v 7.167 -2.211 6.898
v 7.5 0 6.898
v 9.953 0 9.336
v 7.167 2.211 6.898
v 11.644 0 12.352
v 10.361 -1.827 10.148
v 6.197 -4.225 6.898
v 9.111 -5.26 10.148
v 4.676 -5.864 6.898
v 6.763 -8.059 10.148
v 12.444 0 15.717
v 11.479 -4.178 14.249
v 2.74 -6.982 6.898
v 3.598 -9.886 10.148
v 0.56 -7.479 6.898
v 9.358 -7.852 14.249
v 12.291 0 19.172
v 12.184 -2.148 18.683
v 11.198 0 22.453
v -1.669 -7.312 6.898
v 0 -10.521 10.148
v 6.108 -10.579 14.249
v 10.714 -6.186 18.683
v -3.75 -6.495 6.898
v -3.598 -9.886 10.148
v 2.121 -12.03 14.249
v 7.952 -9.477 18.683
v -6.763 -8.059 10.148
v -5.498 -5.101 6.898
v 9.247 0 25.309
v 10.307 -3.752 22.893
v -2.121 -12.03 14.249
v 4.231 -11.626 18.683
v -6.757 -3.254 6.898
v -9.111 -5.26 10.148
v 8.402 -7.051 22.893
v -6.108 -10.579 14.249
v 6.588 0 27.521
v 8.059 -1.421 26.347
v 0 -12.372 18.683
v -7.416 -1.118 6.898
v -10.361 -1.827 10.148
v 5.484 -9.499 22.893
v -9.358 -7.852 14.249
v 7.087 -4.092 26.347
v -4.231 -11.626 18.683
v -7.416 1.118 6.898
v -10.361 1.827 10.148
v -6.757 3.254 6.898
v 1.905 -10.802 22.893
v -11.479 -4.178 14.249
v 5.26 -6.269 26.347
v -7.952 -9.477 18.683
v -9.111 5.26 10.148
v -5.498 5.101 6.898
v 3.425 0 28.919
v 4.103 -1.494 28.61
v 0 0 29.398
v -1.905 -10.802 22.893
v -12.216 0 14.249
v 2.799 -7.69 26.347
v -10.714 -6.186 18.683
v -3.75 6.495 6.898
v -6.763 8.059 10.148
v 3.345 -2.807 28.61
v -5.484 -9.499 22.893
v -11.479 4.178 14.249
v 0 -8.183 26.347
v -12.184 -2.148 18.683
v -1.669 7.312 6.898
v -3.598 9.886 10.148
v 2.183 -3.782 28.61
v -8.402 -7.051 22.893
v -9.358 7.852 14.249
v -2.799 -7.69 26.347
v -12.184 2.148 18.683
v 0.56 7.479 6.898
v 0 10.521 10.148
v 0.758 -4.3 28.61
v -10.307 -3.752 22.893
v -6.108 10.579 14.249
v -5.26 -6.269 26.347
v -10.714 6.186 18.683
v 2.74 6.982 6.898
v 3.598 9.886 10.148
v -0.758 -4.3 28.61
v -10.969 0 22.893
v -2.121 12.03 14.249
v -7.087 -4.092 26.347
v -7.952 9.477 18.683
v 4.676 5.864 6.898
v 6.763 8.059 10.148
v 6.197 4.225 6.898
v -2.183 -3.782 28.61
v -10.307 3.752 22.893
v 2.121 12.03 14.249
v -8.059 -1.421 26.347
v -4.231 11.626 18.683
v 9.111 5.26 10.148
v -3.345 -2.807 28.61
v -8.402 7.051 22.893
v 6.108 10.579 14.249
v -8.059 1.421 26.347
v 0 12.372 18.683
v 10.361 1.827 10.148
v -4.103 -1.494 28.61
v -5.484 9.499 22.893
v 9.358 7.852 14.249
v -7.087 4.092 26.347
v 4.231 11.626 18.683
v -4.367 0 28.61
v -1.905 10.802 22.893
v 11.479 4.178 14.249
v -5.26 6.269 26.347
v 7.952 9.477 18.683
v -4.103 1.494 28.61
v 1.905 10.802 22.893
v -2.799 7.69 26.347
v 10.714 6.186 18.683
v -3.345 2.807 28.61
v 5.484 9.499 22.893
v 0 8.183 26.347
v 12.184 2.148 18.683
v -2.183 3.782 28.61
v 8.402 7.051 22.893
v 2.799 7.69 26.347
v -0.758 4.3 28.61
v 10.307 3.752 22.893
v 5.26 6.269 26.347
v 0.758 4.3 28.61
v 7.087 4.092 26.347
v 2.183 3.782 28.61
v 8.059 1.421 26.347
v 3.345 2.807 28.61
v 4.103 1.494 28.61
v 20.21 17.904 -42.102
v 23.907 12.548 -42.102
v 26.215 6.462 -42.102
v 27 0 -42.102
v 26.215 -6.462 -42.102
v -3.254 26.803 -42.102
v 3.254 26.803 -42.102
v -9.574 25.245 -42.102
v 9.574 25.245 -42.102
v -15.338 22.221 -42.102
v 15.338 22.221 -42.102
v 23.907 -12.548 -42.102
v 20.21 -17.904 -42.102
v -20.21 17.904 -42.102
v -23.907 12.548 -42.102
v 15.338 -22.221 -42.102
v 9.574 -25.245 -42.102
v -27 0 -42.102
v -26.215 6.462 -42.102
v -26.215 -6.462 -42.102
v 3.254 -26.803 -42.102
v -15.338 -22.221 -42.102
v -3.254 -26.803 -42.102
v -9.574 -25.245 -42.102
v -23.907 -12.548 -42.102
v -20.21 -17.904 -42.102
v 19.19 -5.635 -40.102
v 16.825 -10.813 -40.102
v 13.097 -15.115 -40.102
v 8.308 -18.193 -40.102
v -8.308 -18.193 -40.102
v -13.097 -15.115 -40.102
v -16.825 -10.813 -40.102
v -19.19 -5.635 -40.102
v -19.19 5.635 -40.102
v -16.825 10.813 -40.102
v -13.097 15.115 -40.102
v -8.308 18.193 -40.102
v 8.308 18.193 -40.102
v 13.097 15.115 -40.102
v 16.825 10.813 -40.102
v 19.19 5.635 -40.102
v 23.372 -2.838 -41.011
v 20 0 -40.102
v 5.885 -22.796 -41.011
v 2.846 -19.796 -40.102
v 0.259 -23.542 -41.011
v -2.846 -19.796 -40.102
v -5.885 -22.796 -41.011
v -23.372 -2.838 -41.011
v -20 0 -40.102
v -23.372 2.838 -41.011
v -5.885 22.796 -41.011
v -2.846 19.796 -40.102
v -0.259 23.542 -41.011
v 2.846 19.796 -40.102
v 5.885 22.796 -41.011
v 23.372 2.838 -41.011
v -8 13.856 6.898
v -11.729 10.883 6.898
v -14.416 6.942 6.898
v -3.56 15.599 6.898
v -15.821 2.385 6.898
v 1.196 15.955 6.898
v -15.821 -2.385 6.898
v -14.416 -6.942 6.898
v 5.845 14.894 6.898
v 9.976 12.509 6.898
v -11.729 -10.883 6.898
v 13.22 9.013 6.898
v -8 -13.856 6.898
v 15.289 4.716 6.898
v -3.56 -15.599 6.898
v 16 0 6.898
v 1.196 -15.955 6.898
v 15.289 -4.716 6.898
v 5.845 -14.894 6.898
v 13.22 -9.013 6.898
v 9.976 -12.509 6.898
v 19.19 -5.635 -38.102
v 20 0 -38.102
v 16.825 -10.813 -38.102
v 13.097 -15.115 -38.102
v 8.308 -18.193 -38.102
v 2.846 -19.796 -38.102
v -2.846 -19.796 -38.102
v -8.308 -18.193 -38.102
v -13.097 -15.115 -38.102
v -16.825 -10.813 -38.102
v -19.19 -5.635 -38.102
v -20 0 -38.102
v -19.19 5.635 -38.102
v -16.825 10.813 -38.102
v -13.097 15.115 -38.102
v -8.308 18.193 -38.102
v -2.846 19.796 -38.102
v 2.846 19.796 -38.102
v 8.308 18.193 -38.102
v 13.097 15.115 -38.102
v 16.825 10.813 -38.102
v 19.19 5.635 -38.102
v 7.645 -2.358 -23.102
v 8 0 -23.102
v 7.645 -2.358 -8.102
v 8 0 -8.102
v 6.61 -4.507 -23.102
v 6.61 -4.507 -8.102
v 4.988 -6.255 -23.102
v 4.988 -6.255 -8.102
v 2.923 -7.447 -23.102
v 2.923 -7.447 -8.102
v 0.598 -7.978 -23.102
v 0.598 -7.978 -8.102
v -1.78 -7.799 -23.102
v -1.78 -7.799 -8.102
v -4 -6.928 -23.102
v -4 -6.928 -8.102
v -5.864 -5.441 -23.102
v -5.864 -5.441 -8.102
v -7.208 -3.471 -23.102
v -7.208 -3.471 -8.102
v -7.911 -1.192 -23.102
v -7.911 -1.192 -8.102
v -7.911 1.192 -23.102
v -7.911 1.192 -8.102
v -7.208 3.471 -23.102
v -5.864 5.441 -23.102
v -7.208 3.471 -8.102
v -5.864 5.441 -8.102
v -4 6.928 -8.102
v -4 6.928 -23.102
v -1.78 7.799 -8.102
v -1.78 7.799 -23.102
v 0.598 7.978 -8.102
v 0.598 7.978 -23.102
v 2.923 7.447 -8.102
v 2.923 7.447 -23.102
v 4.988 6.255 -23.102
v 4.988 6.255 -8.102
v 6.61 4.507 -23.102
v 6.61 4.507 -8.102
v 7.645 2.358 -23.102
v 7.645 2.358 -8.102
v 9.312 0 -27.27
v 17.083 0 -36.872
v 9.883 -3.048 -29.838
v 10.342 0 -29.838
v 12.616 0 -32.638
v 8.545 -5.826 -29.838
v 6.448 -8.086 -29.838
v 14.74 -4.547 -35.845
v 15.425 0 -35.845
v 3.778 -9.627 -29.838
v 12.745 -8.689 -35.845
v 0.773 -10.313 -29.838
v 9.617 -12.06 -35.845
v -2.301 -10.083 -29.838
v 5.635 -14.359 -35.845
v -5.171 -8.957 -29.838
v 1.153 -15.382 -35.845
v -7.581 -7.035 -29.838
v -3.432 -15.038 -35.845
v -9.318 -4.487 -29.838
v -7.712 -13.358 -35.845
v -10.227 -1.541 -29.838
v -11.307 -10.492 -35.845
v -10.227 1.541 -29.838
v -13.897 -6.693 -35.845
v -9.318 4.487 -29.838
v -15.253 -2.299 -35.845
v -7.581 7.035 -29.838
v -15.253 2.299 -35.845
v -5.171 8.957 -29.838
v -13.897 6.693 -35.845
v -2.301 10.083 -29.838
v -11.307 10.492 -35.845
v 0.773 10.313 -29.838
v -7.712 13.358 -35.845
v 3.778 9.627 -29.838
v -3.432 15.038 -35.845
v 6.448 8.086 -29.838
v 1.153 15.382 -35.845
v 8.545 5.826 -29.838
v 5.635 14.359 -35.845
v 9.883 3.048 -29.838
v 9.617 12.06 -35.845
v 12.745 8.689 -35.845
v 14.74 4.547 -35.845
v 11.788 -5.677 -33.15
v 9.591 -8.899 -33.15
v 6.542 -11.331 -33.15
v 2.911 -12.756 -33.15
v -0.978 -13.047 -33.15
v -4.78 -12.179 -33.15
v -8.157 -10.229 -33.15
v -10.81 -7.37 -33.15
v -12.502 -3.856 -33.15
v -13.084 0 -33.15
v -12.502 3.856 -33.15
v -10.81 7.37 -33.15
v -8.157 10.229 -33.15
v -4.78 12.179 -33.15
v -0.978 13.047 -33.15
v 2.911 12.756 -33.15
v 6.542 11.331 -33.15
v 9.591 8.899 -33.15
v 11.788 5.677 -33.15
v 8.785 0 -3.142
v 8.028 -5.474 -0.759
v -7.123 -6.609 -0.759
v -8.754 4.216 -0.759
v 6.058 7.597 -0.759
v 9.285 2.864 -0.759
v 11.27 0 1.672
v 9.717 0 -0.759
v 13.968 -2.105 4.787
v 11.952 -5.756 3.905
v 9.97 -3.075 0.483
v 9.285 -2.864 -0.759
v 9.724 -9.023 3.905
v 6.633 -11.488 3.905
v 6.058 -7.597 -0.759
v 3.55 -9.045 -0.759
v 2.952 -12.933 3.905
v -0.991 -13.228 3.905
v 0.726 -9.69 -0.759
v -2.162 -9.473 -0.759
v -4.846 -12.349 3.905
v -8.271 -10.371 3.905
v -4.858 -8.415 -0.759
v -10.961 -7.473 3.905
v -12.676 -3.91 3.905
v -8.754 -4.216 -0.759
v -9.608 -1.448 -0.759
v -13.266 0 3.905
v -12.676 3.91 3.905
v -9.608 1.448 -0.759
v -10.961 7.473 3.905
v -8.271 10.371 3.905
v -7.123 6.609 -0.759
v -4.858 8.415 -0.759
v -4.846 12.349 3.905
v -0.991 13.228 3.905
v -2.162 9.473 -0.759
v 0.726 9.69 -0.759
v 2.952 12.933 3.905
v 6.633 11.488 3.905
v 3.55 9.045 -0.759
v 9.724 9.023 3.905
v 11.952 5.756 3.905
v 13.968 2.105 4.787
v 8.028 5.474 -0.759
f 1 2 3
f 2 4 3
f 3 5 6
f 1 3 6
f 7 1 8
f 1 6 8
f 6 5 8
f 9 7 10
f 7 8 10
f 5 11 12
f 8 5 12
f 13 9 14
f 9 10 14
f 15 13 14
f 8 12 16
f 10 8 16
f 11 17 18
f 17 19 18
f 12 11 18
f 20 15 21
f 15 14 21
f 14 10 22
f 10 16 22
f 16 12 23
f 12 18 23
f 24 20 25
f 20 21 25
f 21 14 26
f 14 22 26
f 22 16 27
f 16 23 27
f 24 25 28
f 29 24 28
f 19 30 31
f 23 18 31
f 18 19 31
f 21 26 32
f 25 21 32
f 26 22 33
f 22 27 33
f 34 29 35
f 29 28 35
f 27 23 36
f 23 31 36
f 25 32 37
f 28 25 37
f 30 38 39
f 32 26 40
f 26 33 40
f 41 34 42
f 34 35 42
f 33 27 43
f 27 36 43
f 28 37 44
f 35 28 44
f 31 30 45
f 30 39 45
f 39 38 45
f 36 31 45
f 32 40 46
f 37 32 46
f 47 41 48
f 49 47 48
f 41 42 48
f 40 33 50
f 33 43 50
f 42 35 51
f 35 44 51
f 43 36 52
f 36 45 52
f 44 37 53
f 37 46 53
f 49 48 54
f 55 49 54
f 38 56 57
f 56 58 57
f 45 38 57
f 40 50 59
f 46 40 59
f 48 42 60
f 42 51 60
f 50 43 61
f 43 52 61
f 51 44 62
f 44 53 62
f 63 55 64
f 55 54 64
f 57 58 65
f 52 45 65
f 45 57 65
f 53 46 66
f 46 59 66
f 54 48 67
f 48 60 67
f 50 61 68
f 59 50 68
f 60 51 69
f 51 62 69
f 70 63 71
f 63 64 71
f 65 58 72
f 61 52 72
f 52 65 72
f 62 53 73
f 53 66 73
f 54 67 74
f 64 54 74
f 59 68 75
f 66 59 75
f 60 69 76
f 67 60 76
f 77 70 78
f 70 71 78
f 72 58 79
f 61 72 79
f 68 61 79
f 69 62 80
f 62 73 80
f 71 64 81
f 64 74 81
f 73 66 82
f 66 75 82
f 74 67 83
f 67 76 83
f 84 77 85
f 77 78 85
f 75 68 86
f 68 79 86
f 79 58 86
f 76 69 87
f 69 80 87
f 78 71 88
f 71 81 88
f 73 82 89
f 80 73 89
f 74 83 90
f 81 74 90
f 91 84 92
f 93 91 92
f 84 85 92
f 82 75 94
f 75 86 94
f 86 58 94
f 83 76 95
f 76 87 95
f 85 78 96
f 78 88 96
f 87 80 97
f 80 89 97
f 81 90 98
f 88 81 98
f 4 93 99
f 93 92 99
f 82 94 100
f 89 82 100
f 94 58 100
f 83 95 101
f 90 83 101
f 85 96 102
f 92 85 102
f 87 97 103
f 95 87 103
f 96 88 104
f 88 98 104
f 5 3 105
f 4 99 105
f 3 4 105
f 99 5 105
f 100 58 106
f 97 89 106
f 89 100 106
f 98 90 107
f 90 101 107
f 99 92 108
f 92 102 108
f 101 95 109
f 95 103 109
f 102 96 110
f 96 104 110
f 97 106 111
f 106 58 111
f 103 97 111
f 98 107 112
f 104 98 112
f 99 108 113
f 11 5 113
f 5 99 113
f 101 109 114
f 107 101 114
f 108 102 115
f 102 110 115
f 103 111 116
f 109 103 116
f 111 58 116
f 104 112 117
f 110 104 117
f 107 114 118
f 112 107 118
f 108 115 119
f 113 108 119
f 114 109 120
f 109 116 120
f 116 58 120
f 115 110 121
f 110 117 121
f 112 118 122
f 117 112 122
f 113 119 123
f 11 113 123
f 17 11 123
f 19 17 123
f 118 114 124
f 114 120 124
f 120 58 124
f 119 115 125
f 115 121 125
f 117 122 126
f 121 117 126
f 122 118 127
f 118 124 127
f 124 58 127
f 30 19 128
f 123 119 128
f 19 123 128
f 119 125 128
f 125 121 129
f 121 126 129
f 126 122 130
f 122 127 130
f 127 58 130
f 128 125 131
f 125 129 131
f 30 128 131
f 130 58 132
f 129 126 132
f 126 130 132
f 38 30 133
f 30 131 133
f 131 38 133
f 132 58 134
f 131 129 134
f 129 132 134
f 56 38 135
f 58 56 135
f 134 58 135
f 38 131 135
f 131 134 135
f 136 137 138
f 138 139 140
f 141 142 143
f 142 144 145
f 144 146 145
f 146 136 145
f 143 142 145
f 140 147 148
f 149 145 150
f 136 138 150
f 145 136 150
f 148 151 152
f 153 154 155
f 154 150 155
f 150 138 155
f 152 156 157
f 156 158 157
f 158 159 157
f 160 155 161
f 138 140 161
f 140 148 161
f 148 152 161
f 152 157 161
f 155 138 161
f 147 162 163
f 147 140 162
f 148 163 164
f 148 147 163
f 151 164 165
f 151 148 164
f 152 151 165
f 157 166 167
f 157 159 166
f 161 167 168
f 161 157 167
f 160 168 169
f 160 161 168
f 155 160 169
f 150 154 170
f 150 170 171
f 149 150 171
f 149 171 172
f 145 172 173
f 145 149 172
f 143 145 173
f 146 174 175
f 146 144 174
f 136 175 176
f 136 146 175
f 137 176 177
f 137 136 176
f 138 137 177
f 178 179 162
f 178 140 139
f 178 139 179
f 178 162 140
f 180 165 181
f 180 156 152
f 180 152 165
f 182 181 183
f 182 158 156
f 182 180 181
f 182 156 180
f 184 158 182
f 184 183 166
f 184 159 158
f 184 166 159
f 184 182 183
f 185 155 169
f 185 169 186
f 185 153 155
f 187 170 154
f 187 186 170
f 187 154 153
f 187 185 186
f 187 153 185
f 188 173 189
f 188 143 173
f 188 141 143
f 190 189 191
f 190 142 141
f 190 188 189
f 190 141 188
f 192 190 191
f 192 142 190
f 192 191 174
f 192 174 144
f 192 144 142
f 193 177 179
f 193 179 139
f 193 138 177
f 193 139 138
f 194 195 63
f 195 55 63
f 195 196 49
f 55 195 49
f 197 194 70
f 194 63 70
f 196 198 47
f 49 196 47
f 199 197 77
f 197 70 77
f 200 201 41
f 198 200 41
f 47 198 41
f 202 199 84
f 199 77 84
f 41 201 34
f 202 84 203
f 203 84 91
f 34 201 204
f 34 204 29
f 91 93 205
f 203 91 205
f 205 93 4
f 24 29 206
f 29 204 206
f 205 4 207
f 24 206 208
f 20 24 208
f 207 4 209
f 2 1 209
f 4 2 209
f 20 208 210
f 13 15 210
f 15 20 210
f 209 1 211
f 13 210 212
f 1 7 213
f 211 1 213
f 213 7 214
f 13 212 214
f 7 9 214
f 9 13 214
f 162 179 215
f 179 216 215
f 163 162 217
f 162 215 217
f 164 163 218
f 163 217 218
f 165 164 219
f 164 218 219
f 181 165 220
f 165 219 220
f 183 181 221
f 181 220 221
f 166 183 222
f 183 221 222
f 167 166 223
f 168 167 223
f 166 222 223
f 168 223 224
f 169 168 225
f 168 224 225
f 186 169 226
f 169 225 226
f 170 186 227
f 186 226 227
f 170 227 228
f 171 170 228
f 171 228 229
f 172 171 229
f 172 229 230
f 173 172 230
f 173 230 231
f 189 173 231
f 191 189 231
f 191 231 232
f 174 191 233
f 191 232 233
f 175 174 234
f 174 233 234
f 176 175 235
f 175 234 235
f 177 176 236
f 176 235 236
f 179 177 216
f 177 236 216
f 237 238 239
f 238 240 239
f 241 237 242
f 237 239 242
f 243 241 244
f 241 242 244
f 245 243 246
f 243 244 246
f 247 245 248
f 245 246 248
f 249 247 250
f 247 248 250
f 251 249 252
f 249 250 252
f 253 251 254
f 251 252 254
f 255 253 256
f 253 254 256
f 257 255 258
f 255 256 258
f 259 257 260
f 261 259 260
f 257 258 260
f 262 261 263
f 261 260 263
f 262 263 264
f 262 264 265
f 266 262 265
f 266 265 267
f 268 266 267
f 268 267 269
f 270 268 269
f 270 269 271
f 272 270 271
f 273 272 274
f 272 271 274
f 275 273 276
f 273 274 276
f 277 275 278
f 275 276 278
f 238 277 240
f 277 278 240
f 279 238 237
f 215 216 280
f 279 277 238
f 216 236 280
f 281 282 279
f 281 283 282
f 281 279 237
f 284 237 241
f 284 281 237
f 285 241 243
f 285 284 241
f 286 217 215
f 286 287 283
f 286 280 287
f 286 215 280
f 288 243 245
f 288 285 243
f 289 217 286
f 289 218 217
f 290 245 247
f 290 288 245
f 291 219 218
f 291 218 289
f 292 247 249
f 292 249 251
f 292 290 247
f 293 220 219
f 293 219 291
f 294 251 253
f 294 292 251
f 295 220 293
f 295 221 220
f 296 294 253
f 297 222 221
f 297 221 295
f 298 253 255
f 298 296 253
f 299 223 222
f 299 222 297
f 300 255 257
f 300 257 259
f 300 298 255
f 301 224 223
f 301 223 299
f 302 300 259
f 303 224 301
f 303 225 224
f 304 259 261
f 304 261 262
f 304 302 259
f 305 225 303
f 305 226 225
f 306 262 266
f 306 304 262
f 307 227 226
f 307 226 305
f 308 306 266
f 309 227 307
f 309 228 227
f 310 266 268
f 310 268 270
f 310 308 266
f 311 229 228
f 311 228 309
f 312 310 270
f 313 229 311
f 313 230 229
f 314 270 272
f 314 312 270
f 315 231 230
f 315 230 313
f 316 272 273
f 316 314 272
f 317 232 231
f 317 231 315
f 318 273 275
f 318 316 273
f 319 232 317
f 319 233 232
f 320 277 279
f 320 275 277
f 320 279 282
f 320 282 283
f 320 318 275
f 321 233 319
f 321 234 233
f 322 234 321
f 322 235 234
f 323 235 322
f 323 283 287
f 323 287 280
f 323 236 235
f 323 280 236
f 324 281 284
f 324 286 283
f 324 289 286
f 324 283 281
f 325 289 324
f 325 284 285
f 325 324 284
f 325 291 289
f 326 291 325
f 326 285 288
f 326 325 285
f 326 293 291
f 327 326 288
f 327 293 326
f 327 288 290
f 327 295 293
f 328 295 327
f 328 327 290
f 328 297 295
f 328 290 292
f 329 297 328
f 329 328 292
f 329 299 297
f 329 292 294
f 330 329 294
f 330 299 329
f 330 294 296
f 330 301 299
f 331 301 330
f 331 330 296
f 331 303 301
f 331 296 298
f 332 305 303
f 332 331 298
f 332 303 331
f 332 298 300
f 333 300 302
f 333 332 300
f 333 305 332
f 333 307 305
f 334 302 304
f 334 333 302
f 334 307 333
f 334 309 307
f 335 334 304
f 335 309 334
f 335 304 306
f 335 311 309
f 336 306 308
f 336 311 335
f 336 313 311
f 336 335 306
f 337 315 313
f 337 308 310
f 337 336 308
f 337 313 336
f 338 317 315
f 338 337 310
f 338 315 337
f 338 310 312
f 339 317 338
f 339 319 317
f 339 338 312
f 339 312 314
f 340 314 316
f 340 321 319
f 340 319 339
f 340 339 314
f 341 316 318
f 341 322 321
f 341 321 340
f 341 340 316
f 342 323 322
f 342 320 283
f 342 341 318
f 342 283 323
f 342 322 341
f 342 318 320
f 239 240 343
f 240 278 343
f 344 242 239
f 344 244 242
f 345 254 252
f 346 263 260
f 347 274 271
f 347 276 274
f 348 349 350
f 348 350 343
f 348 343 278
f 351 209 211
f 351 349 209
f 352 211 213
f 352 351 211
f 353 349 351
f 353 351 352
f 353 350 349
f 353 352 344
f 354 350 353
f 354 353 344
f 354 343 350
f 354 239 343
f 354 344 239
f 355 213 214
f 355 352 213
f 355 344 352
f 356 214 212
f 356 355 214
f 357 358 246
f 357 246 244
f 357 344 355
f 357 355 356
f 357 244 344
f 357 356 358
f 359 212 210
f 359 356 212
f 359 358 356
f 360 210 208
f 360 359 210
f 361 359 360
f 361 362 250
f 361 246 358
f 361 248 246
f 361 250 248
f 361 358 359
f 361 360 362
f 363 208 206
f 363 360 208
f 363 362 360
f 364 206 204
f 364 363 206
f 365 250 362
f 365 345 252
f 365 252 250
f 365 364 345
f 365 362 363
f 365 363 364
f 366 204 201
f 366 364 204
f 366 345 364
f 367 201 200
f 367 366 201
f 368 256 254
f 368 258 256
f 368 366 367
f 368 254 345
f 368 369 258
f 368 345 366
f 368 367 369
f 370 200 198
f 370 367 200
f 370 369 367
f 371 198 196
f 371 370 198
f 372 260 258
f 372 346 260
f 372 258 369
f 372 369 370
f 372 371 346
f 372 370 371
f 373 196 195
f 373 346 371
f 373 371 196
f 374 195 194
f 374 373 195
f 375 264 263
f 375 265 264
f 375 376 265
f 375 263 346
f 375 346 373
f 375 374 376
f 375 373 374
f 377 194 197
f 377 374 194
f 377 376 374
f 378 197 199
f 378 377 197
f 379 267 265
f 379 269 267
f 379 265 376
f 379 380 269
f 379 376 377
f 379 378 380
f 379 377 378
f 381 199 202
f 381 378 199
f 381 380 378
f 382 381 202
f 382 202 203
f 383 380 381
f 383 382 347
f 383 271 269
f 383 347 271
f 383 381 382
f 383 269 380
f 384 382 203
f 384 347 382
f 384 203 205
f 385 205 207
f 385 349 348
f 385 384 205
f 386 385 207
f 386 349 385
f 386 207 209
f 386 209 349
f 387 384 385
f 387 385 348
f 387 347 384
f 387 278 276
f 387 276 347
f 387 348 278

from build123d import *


with BuildPart() as f1:
    # F0 (on Front) → F1 (revolve)
    with BuildSketch(Plane.XZ):
        with BuildLine():
            Line((16, 6.8978102505), (7.5, 6.8978102505))
            ThreePointArc((7.5, 6.8978102505), (11.8585412256, 20.8506573257), (0, 29.3978102505))
            Line((0, 29.3978102505), (0, -40.1021897495))
            Line((0, -40.1021897495), (0, -42.1021897495))
            Line((0, -42.1021897495), (27, -42.1021897495))
            add(Edge.make_bspline(
                [(20, -40.1021897495), (21.1941168938, -40.3914195553), (23.5711927758, -40.9671765849), (25.860646462, -41.7250378187), (27, -42.1021897495)],
                knots=[0, 0, 0, 0, 0.5023469814, 1, 1, 1, 1], degree=3))
            Line((20, -40.1021897495), (20, -38.1021897495))
            add(Edge.make_bspline(
                [(8, -23.1021897495), (8.4116986172, -24.3725126167), (9.2141891192, -26.8486492684), (10.1557921826, -30.261356741), (13.6841732577, -33.5767875841), (15.2886480583, -36.2616137633), (18.3100686008, -37.4419870752), (20, -38.1021897495)],
                knots=[0, 0, 0, 0, 0.1981709642, 0.3862784812, 0.6019803529, 0.7773809075, 1, 1, 1, 1], degree=3))
            Line((8, -23.1021897495), (8, -8.1021897495))
            add(Edge.make_bspline(
                [(16, 6.8978102505), (15.784768845, 6.6281214852), (15.2642741944, 5.9759317051), (13.6752468804, 4.3027483389), (11.1275981536, 1.7691261968), (9.0660220221, -1.7295241114), (8.3874027664, -4.7571299872), (8.1309092124, -6.971843823), (8, -8.1021897495)],
                knots=[0, 0, 0, 0, 0.1049711949, 0.2538524008, 0.4446112015, 0.6438961042, 0.8182516488, 1, 1, 1, 1], degree=3))
        make_face()
    revolve(axis=Axis((0, 0, -6.3521897495), (0, 0, -1)))


solid = f1.part
